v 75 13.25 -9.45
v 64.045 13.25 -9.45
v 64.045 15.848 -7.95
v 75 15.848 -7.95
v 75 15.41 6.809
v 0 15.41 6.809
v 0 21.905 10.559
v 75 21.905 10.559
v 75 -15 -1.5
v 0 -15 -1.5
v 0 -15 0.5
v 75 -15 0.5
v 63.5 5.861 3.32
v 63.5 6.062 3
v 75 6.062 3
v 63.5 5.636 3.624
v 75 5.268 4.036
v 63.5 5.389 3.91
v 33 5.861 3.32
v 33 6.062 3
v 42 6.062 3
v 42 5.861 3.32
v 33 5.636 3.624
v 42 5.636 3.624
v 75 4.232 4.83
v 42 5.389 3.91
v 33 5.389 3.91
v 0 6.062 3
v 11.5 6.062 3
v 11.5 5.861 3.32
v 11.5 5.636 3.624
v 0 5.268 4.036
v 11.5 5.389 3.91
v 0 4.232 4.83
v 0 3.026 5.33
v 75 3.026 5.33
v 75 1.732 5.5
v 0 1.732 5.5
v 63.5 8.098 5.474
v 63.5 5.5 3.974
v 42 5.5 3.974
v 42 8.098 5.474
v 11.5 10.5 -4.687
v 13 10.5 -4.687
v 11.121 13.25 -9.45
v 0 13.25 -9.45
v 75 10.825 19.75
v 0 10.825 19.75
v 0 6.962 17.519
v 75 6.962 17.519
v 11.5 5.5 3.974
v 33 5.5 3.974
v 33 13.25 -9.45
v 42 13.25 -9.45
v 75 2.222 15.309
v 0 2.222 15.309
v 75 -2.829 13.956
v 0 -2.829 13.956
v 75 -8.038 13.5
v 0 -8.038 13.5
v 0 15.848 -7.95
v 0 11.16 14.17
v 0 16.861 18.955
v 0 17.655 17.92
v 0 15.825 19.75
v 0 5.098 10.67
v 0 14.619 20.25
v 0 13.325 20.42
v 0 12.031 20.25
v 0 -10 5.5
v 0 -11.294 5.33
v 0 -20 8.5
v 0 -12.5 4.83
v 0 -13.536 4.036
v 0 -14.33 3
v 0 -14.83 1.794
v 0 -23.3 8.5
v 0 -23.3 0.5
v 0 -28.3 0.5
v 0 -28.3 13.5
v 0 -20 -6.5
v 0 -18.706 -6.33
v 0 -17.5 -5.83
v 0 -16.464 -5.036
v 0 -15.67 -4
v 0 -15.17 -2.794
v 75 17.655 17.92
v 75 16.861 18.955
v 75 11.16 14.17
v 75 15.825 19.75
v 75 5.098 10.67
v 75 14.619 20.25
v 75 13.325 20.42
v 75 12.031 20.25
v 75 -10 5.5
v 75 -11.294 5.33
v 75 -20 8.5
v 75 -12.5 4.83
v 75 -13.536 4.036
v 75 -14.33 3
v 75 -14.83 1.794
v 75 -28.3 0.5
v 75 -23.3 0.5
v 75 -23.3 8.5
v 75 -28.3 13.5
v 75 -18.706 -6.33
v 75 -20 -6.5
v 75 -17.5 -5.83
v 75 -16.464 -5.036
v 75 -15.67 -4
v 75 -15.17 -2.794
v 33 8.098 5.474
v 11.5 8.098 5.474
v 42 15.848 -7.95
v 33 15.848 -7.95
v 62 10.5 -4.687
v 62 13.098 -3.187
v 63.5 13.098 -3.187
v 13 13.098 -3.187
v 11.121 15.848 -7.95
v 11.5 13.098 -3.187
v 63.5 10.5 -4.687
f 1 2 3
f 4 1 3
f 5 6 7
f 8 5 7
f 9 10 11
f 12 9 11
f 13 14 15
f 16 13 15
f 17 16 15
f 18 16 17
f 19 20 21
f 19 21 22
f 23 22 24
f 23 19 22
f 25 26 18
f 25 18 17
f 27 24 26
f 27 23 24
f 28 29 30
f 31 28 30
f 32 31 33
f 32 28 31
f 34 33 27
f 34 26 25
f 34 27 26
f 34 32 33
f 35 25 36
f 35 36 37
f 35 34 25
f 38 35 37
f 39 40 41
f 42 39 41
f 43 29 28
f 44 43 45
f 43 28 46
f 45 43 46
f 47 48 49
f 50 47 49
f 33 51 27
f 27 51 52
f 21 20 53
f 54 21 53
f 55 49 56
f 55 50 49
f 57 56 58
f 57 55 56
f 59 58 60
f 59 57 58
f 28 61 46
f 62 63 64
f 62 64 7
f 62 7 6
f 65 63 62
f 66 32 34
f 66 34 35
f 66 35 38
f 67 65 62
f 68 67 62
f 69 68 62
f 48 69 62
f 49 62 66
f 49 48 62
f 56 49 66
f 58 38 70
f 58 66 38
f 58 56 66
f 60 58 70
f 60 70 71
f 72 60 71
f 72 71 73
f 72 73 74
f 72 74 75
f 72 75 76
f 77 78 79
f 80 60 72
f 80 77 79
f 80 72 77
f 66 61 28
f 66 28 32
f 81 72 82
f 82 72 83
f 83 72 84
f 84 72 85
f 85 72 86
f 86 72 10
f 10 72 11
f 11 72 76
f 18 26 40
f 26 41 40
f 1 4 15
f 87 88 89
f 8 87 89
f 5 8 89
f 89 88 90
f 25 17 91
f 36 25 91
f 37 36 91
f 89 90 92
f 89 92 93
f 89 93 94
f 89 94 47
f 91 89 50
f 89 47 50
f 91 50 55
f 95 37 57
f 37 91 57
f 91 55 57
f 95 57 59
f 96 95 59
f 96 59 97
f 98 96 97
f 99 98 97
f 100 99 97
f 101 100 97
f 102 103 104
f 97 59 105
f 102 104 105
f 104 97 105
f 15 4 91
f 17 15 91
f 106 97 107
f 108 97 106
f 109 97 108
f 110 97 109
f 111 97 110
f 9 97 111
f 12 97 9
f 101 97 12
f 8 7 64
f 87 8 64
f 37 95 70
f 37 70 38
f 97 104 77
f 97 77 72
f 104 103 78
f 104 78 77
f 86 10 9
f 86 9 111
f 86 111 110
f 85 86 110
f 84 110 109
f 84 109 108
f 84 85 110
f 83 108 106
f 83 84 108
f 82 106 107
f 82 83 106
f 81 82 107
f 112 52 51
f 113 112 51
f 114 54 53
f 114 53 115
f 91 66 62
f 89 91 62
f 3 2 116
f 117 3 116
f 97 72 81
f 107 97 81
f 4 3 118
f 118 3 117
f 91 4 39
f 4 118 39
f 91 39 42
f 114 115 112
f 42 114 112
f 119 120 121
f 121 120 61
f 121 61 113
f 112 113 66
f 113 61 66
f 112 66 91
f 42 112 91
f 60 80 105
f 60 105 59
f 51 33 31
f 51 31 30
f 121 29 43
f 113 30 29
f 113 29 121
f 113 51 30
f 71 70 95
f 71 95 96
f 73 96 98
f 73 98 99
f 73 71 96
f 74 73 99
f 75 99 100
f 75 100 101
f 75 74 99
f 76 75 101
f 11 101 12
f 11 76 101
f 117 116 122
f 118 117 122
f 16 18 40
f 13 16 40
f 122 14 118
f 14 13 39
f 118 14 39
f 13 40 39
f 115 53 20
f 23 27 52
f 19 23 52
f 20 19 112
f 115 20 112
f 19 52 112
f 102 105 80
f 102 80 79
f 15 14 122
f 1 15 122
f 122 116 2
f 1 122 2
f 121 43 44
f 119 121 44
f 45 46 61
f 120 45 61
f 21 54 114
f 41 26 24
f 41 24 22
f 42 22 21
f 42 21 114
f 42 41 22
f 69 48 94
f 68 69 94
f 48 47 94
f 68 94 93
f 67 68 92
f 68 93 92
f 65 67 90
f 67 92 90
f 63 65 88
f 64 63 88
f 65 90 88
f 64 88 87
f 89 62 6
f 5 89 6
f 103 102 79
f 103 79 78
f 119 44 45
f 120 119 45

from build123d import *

# Parameters (mm, degrees)
F1_DEPTH      = 75
F2_W          = 3.3
F2_H          = 5
F3_DEPTH      = 75
F5_DEPTH      = 3
F6_ANGLE      = -30
F7_W          = 15
F7_H          = 8
F8_DEPTH      = 75
F9_R          = 5
F10_T1_DEPTH  = 75
F10_T6_DEPTH  = 82.2168783649
F10_T11_DEPTH = 82.2168783649
F10_T17_DEPTH = 89.4337567297
F10_T23_DEPTH = 82.2168783649
F10_T25_DEPTH = 100
F11_R         = 30


# Not quite as in the source:
# - a fillet or chamfer that OpenCascade refuses, or shapes differently, is made with other operations: its cross-section is extruded or revolved along the edge and cut away or added


with BuildPart() as f1:
    # F0 (on Right) → F1 (new body)
    with BuildSketch(Plane.YZ):
        Polygon((3, 13.5), (0, 13.5), (0, -13), (3, -13), (3, 8.5), (10, 8.5), (10, 0), (17.5, 0), (17.5, 13.5), (10, 13.5), align=None)
    extrude(amount=F1_DEPTH)

    # F4 (on Front) → F5 (cut, through all)
    with BuildSketch(Plane.XZ):
        Polygon((11.5, 2.5), (11.5, -7.5), (13, -7.5), (11.1212156062, -13), (33, -13), (33, -7.4999375637), (33, 2.5), align=None)
        Polygon((63.5, 2.5), (42, 2.5), (42, -7.4999375637), (42, -13), (64.044855535, -13), (62, -7.5), (63.5, -7.5), align=None)
    extrude(amount=-F5_DEPTH, mode=Mode.SUBTRACT)


with BuildPart() as f3:
    # F2 (on Right) → F3 (new body)
    with BuildSketch(Plane.YZ):
        Polygon((-23.3, 13.5), (-28.3, 13.5), (-28.3, 0.5), (-23.3, 0.5), (-23.3, 8.5), align=None)
        with Locations((-21.65, 11)):
            Rectangle(F2_W, F2_H)
        Polygon((-15, 13.5), (-20, 13.5), (-20, 8.5), (-20, -6.5), (-15, -6.5), align=None)
    extrude(amount=F3_DEPTH)


with BuildPart() as f1_1:
    # F6: moved
    add(f1.part.rotate(Axis((37.5, 0, 13.5), (-1, 0, 0)), F6_ANGLE))


    add(f3.part)  # F8 merges F3
    # F7 (on Right) → F8 (join)
    with BuildSketch(Plane.YZ):
        with Locations((-7.5, 9.5)):
            Rectangle(F7_W, F7_H)
        Polygon((5.764299538, 5.5), (0, 13.5), (0, 5.5), align=None)
    extrude(amount=F8_DEPTH)

    # F9
    f9_edges = [f1_1.edges().sort_by_distance(p)[0] for p in [
        (37.5, 15.155445, 22.25),
    ]]
    fillet(f9_edges, radius=F9_R)

    # F10: fillet of radius 5 on 3 edges, made by hand

    # F10_s2 → F10_t1 (join)
    with BuildSketch(Plane.YZ):
        with BuildLine():
            ThreePointArc((-10, 5.5), (-13.5355339059, 4.0355339059), (-15, 0.5))
            Line((-15, 0.5), (-15, 5.5))
            Line((-15, 5.5), (-10, 5.5))
        make_face()
    extrude(amount=F10_T1_DEPTH)


with BuildPart() as f10_tool4:
    # F10_s5 → F10_t6 (new body)
    with BuildSketch(Plane.YZ):
        with BuildLine():
            ThreePointArc((6.0621778265, 3), (4.2320508076, 4.8301270189), (1.7320508076, 5.5))
            Line((1.7320508076, 5.5), (4.6188021535, 5.5))
            Line((4.6188021535, 5.5), (6.0621778265, 3))
        make_face()
    extrude(amount=F10_T6_DEPTH)

    split(bisect_by=Plane.YZ.offset(11.5), keep=Keep.BOTTOM)


with BuildPart() as f1_2:
    add(f1_1.part)

    # F10_t3: union F10_tool4
    add(f10_tool4.part)


with BuildPart() as f10_tool9:
    # F10_s10 → F10_t11 (new body)
    with BuildSketch(Plane.YZ.offset(-7.2168783649)):
        with BuildLine():
            ThreePointArc((6.0621778265, 3), (4.2320508076, 4.8301270189), (1.7320508076, 5.5))
            Line((1.7320508076, 5.5), (4.6188021535, 5.5))
            Line((4.6188021535, 5.5), (6.0621778265, 3))
        make_face()
    extrude(amount=F10_T11_DEPTH)

    split(bisect_by=Plane(origin=(0, -0.3456714755, 0.5987205584), x_dir=(1, 0, 0), z_dir=(0, -0.5, 0.8660254038)), keep=Keep.TOP)

    split(bisect_by=Plane.YZ.offset(11.5), keep=Keep.TOP)


with BuildPart() as f1_3:
    add(f1_2.part)

    # F10_t8: union F10_tool9
    add(f10_tool9.part)


with BuildPart() as f10_tool15:
    # F10_s16 → F10_t17 (new body)
    with BuildSketch(Plane.YZ.offset(-7.2168783649)):
        with BuildLine():
            ThreePointArc((6.0621778265, 3), (4.2320508076, 4.8301270189), (1.7320508076, 5.5))
            Line((1.7320508076, 5.5), (4.6188021535, 5.5))
            Line((4.6188021535, 5.5), (6.0621778265, 3))
        make_face()
    extrude(amount=F10_T17_DEPTH)

    split(bisect_by=Plane.YZ.offset(42), keep=Keep.BOTTOM)

    split(bisect_by=Plane.YZ.offset(33), keep=Keep.TOP)


with BuildPart() as f1_4:
    add(f1_3.part)

    # F10_t14: union F10_tool15
    add(f10_tool15.part)


with BuildPart() as f10_tool21:
    # F10_s22 → F10_t23 (new body)
    with BuildSketch(Plane.YZ.offset(-7.2168783649)):
        with BuildLine():
            ThreePointArc((6.0621778265, 3), (4.2320508076, 4.8301270189), (1.7320508076, 5.5))
            Line((1.7320508076, 5.5), (4.6188021535, 5.5))
            Line((4.6188021535, 5.5), (6.0621778265, 3))
        make_face()
    extrude(amount=F10_T23_DEPTH)

    split(bisect_by=Plane.YZ.offset(63.5), keep=Keep.TOP)


with BuildPart() as f1_5:
    add(f1_4.part)

    # F10_t20: union F10_tool21
    add(f10_tool21.part)

    # F10_s26 → F10_t25 (cut)
    with BuildSketch(Plane.YZ.offset(-12.5)):
        with BuildLine():
            ThreePointArc((-15, -1.5), (-16.4644660941, -5.0355339059), (-20, -6.5))
            Line((-20, -6.5), (-15, -6.5))
            Line((-15, -6.5), (-15, -1.5))
        make_face()
    extrude(amount=F10_T25_DEPTH, mode=Mode.SUBTRACT)

    # F11
    f11_edges = [f1_5.edges().sort_by_distance(p)[0] for p in [
        (37.5, 0, 13.5),
    ]]
    fillet(f11_edges, radius=F11_R)


solid = f1_5.part
